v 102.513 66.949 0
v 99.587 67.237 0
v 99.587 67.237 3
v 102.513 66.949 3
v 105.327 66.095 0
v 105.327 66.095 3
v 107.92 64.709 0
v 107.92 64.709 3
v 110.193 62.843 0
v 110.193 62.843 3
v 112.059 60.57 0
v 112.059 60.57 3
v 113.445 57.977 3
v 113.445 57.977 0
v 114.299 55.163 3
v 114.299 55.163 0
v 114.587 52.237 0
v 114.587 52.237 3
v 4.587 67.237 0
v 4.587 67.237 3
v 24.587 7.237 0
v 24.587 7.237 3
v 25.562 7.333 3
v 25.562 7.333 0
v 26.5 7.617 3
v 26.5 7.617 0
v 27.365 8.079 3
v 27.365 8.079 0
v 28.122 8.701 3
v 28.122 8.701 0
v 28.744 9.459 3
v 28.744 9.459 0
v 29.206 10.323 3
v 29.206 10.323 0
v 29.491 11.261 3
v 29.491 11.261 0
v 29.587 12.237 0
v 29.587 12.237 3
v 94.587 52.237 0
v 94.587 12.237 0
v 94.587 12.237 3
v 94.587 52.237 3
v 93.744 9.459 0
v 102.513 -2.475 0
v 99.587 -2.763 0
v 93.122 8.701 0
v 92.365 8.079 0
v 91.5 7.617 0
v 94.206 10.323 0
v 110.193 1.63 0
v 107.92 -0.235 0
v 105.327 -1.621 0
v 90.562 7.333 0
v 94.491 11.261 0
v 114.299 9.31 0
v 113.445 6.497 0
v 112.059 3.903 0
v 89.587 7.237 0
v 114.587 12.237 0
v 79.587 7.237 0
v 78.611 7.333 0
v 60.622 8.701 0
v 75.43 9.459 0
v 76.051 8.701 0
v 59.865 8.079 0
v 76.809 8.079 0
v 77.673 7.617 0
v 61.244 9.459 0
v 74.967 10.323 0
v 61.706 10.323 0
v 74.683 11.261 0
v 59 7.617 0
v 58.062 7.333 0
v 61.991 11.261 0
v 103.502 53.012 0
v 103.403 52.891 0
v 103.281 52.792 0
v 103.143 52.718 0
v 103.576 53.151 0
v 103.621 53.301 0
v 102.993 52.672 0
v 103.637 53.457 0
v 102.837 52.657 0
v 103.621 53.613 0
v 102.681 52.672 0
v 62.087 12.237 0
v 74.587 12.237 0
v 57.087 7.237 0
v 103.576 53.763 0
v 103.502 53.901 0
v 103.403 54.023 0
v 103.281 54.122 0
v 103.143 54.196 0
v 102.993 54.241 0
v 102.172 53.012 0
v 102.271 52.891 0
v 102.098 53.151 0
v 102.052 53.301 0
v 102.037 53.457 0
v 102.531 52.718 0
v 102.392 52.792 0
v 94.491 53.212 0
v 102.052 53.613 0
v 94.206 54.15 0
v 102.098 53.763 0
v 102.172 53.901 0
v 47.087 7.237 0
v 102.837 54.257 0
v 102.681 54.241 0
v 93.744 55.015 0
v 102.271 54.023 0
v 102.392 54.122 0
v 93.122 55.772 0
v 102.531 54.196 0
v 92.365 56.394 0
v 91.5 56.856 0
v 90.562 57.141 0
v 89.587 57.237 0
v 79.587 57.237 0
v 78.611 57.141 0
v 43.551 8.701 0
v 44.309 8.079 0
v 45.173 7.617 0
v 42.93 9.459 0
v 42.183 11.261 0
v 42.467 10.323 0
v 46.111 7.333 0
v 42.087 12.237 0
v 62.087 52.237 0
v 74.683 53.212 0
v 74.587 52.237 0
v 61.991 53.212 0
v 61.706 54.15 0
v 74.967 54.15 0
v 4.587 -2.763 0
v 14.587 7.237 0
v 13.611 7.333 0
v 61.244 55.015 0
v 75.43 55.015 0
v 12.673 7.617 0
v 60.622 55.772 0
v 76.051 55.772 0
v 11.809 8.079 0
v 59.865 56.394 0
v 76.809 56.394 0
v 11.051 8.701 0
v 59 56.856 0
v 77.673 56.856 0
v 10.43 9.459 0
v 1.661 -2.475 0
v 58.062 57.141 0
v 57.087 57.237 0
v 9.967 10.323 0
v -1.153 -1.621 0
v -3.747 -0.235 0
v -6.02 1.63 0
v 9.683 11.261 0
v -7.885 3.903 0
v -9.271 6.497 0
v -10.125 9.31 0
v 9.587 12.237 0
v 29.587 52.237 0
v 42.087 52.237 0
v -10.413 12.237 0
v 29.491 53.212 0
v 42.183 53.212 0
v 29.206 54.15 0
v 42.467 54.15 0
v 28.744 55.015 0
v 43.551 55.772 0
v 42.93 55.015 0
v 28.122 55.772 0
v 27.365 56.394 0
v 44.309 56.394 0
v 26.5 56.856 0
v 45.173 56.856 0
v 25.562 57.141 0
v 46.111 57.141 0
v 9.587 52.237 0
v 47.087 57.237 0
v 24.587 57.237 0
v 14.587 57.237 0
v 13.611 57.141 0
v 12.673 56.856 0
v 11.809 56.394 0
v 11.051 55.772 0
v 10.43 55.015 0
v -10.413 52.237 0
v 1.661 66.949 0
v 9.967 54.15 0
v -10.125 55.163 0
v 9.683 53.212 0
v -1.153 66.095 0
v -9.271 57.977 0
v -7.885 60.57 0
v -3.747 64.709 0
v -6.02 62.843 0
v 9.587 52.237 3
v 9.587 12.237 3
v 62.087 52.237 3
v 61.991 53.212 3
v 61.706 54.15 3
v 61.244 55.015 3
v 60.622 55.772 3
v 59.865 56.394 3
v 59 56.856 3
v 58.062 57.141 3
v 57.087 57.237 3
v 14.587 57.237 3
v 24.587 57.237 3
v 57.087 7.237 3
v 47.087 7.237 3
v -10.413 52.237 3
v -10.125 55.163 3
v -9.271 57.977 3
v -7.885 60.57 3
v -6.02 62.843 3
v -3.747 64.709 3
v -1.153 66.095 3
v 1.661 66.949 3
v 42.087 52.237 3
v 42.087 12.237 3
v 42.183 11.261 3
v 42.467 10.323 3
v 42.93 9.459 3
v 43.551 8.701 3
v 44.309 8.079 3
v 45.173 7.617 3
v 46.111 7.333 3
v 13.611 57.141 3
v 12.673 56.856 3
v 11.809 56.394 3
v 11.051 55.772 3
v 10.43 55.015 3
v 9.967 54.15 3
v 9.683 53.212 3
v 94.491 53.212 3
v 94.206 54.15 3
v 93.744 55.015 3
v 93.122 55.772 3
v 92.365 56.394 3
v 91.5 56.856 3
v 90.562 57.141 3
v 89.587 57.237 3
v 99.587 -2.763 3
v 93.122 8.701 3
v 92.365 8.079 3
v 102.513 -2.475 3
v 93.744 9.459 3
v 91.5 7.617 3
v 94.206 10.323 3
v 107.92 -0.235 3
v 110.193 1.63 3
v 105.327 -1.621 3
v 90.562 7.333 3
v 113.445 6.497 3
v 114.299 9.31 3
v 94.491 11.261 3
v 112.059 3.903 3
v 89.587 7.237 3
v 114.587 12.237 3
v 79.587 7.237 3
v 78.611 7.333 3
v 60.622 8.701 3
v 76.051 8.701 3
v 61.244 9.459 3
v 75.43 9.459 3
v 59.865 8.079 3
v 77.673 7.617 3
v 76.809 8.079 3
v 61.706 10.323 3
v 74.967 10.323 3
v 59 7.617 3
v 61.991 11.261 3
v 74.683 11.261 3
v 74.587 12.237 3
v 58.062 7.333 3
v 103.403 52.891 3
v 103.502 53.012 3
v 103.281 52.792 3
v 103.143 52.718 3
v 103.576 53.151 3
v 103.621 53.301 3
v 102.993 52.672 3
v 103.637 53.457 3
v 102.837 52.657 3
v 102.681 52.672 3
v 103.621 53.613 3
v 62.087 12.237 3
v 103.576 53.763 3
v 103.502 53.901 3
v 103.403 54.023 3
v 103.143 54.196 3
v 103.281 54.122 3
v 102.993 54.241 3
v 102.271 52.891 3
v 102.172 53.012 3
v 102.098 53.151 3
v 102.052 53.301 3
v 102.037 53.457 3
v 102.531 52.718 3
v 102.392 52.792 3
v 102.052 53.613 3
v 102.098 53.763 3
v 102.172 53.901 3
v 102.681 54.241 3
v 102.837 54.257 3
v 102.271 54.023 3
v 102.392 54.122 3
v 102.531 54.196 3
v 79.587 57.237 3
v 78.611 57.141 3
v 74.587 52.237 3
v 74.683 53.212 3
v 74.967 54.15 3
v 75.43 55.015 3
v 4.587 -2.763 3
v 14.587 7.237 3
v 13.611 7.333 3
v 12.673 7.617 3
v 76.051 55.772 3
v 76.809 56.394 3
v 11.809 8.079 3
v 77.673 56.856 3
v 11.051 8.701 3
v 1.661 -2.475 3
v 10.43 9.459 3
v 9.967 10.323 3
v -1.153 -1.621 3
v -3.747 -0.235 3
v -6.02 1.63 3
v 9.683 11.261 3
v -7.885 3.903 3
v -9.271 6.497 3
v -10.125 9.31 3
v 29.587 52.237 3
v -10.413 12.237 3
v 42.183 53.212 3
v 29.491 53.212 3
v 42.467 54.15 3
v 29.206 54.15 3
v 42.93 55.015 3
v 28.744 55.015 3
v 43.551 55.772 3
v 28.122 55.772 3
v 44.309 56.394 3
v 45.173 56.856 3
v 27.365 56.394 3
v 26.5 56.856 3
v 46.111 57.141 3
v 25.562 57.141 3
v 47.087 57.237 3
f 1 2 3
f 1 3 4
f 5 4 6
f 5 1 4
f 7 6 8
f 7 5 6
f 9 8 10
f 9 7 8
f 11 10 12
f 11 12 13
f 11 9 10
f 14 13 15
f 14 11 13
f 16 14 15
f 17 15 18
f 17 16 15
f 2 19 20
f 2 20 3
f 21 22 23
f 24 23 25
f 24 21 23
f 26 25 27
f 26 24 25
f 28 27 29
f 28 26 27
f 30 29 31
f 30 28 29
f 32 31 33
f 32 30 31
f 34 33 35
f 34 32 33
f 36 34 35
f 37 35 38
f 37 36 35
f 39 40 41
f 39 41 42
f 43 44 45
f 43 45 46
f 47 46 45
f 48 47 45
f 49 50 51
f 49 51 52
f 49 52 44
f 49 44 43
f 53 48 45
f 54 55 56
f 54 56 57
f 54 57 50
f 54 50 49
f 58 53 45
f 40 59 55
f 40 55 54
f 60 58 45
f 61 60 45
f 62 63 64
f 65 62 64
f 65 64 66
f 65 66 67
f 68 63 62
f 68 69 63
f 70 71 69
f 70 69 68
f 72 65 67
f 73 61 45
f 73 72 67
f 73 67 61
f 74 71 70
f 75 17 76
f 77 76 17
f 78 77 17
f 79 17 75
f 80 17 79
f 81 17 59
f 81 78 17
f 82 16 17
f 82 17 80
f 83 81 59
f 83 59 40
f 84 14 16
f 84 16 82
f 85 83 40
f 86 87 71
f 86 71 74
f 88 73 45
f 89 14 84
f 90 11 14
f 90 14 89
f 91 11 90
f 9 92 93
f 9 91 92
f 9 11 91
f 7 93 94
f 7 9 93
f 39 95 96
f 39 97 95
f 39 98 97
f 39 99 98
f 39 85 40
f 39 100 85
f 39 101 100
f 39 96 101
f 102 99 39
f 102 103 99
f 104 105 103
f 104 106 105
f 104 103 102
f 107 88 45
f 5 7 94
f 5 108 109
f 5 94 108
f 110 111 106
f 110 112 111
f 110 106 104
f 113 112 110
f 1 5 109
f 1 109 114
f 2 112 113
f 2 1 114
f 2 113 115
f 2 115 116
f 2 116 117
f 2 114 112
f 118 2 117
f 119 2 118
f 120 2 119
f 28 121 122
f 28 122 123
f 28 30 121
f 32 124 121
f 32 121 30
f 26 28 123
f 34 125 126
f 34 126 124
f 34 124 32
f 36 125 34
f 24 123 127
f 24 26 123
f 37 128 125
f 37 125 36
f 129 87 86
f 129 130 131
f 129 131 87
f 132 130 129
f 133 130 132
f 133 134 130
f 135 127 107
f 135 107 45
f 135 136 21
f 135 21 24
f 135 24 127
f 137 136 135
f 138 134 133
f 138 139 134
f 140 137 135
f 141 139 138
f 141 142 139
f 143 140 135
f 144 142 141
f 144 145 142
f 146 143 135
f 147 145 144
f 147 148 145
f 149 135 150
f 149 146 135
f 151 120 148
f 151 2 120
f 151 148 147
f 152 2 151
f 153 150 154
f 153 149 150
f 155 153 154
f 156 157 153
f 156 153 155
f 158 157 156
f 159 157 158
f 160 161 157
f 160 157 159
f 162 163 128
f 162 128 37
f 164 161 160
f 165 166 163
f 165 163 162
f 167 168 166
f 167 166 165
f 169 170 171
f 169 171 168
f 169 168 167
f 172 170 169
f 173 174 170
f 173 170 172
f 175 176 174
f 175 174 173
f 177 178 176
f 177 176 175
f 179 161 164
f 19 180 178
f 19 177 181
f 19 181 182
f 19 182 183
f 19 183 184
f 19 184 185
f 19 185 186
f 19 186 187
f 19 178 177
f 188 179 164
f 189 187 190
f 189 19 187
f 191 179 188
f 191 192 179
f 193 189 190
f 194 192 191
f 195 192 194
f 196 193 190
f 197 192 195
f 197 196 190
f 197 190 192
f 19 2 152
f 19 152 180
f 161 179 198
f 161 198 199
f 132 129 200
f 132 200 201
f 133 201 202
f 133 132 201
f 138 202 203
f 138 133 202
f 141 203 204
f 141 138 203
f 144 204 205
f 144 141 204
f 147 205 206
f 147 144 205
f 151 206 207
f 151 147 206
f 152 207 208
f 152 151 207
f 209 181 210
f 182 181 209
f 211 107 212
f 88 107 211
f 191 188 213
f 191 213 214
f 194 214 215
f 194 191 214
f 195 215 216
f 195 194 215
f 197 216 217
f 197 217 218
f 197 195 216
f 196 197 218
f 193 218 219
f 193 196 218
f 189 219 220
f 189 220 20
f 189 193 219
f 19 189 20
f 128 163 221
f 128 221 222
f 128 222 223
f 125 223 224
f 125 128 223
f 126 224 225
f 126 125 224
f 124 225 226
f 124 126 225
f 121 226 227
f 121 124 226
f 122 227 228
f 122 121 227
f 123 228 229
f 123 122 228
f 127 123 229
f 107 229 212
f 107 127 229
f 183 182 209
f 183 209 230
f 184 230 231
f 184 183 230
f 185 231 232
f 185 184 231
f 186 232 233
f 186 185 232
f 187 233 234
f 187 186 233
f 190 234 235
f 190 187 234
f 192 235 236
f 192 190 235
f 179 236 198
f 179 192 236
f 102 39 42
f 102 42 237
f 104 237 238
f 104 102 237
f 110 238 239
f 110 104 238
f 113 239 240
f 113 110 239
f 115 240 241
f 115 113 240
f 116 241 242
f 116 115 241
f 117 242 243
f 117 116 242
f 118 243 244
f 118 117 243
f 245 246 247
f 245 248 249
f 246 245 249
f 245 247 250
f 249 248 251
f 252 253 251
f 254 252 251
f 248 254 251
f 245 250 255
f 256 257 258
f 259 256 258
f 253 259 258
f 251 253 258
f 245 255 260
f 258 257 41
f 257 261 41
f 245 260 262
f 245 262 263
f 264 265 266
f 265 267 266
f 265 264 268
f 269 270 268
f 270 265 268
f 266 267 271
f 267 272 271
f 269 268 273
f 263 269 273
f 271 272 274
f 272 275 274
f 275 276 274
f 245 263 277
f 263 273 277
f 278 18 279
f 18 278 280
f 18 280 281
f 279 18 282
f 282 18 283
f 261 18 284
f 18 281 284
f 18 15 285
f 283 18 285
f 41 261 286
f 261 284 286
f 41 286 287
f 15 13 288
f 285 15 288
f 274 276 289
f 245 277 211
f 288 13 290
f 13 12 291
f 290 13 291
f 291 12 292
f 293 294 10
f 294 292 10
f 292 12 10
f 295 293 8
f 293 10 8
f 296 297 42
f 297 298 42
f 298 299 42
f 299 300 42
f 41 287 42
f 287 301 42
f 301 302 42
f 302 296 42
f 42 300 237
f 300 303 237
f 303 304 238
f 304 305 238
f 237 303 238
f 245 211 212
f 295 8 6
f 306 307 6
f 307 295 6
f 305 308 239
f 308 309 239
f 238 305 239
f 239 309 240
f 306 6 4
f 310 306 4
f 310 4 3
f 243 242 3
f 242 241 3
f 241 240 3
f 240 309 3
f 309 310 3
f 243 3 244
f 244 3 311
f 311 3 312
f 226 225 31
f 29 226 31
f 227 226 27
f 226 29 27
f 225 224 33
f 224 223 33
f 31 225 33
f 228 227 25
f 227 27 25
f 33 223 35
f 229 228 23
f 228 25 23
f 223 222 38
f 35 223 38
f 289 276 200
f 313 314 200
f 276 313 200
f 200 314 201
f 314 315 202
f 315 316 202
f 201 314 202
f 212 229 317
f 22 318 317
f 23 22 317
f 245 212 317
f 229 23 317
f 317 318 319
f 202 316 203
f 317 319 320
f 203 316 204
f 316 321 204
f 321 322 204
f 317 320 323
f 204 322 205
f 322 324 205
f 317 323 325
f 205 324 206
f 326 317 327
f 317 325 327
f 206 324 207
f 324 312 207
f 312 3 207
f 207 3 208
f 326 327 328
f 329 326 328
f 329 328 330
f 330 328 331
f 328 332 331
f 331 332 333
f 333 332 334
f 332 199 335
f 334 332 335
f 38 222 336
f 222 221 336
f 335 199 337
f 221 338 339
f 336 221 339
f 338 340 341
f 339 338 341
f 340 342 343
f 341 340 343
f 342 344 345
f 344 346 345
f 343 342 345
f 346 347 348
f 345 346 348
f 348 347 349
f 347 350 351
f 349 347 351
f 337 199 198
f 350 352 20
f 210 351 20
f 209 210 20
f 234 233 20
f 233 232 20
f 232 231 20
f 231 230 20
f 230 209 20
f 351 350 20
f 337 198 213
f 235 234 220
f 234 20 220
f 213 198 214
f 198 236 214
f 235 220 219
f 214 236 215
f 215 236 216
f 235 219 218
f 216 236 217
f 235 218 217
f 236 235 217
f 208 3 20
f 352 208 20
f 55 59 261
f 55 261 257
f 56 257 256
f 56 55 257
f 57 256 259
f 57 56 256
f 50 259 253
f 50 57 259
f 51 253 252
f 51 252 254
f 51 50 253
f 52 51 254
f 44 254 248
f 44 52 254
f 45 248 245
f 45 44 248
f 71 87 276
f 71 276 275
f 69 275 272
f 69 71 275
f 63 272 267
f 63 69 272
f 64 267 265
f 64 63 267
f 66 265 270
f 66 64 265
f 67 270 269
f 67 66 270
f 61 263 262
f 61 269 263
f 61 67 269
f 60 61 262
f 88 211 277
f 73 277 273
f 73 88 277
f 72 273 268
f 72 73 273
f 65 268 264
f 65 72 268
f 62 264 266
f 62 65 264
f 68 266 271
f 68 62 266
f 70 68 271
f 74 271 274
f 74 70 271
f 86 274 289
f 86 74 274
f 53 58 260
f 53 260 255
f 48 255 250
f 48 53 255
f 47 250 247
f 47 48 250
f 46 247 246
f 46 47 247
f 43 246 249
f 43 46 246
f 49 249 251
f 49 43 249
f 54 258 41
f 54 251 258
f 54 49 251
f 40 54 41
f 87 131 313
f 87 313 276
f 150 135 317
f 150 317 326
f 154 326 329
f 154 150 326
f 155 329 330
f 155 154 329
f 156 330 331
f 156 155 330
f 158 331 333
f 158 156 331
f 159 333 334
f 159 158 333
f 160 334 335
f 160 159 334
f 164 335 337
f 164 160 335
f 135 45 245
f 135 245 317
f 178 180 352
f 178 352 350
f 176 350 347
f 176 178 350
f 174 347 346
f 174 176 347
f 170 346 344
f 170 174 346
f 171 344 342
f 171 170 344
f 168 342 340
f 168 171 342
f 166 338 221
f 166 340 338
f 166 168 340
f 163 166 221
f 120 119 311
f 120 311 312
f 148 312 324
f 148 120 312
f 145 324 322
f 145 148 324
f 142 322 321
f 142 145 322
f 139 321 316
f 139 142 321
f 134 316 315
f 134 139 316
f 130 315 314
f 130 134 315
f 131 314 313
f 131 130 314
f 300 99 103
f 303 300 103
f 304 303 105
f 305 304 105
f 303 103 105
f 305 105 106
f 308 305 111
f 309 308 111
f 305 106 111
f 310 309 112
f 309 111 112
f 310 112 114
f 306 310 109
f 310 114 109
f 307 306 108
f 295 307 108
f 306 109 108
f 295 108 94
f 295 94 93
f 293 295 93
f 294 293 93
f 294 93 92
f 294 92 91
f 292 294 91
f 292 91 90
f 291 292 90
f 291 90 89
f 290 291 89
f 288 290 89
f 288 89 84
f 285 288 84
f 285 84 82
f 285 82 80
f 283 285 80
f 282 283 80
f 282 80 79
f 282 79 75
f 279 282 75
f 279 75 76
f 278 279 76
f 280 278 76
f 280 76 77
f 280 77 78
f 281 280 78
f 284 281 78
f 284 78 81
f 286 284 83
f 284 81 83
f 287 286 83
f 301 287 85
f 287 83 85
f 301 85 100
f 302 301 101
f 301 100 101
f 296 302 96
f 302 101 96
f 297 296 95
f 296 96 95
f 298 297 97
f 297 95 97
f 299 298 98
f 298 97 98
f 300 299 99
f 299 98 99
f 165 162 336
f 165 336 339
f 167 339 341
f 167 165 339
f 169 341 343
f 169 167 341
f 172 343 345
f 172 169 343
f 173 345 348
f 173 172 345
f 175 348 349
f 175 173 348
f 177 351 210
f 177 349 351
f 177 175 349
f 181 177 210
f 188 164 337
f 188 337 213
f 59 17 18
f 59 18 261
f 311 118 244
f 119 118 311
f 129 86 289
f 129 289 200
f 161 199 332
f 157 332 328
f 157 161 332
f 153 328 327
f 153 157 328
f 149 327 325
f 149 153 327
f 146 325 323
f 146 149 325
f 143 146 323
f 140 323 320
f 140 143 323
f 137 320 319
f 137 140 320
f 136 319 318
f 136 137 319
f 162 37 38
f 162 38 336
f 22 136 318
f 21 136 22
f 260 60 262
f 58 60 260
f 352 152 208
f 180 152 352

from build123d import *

# Parameters (mm, degrees)
RESSALTO_EXTRUS_O1_DEPTH = 3
ESBO_O2_R                = 0.8
CORTE_EXTRUS_O1_DEPTH    = 4
CORTE_EXTRUS_O2_DEPTH    = 10


with BuildPart() as part:
    # Esboço1 → Ressalto-extrusão1 (new body)
    with BuildSketch(Plane.XY):
        with BuildLine():
            Line((4.586855285, 67.236842105), (99.586855285, 67.236842105))
            ThreePointArc((99.586855285, 67.236842105), (110.193457003, 62.843443823), (114.586855285, 52.236842105))
            Line((114.586855285, 52.236842105), (114.586855285, 12.236842105))
            ThreePointArc((114.586855285, 12.236842105), (110.193457003, 1.630240387), (99.586855285, -2.763157895))
            Line((99.586855285, -2.763157895), (4.586855285, -2.763157895))
            ThreePointArc((4.586855285, -2.763157895), (-6.019746433, 1.630240387), (-10.413144715, 12.236842105))
            Line((-10.413144715, 12.236842105), (-10.413144715, 52.236842105))
            ThreePointArc((-10.413144715, 52.236842105), (-6.019746433, 62.843443823), (4.586855285, 67.236842105))
        make_face()
    extrude(amount=RESSALTO_EXTRUS_O1_DEPTH)

    # Esboço2 → Corte-extrusão1 (cut, through all)
    with BuildSketch(Plane(origin=(0, 0, 0), x_dir=(-1, 0, 0), z_dir=(0, 0, -1))):
        with Locations((-102.836855285, 53.456842105)):
            Circle(ESBO_O2_R)
    extrude(amount=-CORTE_EXTRUS_O1_DEPTH, mode=Mode.SUBTRACT)

    # Esboço3 → Corte-extrusão2 (cut)
    with BuildSketch(Plane(origin=(0, 0, 0), x_dir=(-1, 0, 0), z_dir=(0, 0, -1))):
        with BuildLine():
            Line((-14.586855285, 7.236842105), (-24.586855285, 7.236842105))
            ThreePointArc((-24.586855285, 7.236842105), (-28.122389191, 8.701308199), (-29.586855285, 12.236842105))
            Line((-29.586855285, 12.236842105), (-29.586855285, 52.236842105))
            ThreePointArc((-29.586855285, 52.236842105), (-28.122389191, 55.772376011), (-24.586855285, 57.236842105))
            Line((-24.586855285, 57.236842105), (-14.586855285, 57.236842105))
            ThreePointArc((-14.586855285, 57.236842105), (-11.051321379, 55.772376011), (-9.586855285, 52.236842105))
            Line((-9.586855285, 52.236842105), (-9.586855285, 12.236842105))
            ThreePointArc((-9.586855285, 12.236842105), (-11.051321379, 8.701308199), (-14.586855285, 7.236842105))
        make_face()
        with BuildLine():
            Line((-47.086855285, 7.236842105), (-57.086855285, 7.236842105))
            ThreePointArc((-57.086855285, 7.236842105), (-60.622389191, 8.701308199), (-62.086855285, 12.236842105))
            Line((-62.086855285, 12.236842105), (-62.086855285, 52.236842105))
            ThreePointArc((-62.086855285, 52.236842105), (-60.622389191, 55.772376011), (-57.086855285, 57.236842105))
            Line((-57.086855285, 57.236842105), (-47.086855285, 57.236842105))
            ThreePointArc((-47.086855285, 57.236842105), (-43.551321379, 55.772376011), (-42.086855285, 52.236842105))
            Line((-42.086855285, 52.236842105), (-42.086855285, 12.236842105))
            ThreePointArc((-42.086855285, 12.236842105), (-43.551321379, 8.701308199), (-47.086855285, 7.236842105))
        make_face()
        with BuildLine():
            Line((-79.586855285, 7.236842105), (-89.586855285, 7.236842105))
            ThreePointArc((-89.586855285, 7.236842105), (-93.122389191, 8.701308199), (-94.586855285, 12.236842105))
            Line((-94.586855285, 12.236842105), (-94.586855285, 52.236842105))
            ThreePointArc((-94.586855285, 52.236842105), (-93.122389191, 55.772376011), (-89.586855285, 57.236842105))
            Line((-89.586855285, 57.236842105), (-79.586855285, 57.236842105))
            ThreePointArc((-79.586855285, 57.236842105), (-76.051321379, 55.772376011), (-74.586855285, 52.236842105))
            Line((-74.586855285, 52.236842105), (-74.586855285, 12.236842105))
            ThreePointArc((-74.586855285, 12.236842105), (-76.051321379, 8.701308199), (-79.586855285, 7.236842105))
        make_face()
    extrude(amount=-CORTE_EXTRUS_O2_DEPTH, mode=Mode.SUBTRACT)


solid = part.part
